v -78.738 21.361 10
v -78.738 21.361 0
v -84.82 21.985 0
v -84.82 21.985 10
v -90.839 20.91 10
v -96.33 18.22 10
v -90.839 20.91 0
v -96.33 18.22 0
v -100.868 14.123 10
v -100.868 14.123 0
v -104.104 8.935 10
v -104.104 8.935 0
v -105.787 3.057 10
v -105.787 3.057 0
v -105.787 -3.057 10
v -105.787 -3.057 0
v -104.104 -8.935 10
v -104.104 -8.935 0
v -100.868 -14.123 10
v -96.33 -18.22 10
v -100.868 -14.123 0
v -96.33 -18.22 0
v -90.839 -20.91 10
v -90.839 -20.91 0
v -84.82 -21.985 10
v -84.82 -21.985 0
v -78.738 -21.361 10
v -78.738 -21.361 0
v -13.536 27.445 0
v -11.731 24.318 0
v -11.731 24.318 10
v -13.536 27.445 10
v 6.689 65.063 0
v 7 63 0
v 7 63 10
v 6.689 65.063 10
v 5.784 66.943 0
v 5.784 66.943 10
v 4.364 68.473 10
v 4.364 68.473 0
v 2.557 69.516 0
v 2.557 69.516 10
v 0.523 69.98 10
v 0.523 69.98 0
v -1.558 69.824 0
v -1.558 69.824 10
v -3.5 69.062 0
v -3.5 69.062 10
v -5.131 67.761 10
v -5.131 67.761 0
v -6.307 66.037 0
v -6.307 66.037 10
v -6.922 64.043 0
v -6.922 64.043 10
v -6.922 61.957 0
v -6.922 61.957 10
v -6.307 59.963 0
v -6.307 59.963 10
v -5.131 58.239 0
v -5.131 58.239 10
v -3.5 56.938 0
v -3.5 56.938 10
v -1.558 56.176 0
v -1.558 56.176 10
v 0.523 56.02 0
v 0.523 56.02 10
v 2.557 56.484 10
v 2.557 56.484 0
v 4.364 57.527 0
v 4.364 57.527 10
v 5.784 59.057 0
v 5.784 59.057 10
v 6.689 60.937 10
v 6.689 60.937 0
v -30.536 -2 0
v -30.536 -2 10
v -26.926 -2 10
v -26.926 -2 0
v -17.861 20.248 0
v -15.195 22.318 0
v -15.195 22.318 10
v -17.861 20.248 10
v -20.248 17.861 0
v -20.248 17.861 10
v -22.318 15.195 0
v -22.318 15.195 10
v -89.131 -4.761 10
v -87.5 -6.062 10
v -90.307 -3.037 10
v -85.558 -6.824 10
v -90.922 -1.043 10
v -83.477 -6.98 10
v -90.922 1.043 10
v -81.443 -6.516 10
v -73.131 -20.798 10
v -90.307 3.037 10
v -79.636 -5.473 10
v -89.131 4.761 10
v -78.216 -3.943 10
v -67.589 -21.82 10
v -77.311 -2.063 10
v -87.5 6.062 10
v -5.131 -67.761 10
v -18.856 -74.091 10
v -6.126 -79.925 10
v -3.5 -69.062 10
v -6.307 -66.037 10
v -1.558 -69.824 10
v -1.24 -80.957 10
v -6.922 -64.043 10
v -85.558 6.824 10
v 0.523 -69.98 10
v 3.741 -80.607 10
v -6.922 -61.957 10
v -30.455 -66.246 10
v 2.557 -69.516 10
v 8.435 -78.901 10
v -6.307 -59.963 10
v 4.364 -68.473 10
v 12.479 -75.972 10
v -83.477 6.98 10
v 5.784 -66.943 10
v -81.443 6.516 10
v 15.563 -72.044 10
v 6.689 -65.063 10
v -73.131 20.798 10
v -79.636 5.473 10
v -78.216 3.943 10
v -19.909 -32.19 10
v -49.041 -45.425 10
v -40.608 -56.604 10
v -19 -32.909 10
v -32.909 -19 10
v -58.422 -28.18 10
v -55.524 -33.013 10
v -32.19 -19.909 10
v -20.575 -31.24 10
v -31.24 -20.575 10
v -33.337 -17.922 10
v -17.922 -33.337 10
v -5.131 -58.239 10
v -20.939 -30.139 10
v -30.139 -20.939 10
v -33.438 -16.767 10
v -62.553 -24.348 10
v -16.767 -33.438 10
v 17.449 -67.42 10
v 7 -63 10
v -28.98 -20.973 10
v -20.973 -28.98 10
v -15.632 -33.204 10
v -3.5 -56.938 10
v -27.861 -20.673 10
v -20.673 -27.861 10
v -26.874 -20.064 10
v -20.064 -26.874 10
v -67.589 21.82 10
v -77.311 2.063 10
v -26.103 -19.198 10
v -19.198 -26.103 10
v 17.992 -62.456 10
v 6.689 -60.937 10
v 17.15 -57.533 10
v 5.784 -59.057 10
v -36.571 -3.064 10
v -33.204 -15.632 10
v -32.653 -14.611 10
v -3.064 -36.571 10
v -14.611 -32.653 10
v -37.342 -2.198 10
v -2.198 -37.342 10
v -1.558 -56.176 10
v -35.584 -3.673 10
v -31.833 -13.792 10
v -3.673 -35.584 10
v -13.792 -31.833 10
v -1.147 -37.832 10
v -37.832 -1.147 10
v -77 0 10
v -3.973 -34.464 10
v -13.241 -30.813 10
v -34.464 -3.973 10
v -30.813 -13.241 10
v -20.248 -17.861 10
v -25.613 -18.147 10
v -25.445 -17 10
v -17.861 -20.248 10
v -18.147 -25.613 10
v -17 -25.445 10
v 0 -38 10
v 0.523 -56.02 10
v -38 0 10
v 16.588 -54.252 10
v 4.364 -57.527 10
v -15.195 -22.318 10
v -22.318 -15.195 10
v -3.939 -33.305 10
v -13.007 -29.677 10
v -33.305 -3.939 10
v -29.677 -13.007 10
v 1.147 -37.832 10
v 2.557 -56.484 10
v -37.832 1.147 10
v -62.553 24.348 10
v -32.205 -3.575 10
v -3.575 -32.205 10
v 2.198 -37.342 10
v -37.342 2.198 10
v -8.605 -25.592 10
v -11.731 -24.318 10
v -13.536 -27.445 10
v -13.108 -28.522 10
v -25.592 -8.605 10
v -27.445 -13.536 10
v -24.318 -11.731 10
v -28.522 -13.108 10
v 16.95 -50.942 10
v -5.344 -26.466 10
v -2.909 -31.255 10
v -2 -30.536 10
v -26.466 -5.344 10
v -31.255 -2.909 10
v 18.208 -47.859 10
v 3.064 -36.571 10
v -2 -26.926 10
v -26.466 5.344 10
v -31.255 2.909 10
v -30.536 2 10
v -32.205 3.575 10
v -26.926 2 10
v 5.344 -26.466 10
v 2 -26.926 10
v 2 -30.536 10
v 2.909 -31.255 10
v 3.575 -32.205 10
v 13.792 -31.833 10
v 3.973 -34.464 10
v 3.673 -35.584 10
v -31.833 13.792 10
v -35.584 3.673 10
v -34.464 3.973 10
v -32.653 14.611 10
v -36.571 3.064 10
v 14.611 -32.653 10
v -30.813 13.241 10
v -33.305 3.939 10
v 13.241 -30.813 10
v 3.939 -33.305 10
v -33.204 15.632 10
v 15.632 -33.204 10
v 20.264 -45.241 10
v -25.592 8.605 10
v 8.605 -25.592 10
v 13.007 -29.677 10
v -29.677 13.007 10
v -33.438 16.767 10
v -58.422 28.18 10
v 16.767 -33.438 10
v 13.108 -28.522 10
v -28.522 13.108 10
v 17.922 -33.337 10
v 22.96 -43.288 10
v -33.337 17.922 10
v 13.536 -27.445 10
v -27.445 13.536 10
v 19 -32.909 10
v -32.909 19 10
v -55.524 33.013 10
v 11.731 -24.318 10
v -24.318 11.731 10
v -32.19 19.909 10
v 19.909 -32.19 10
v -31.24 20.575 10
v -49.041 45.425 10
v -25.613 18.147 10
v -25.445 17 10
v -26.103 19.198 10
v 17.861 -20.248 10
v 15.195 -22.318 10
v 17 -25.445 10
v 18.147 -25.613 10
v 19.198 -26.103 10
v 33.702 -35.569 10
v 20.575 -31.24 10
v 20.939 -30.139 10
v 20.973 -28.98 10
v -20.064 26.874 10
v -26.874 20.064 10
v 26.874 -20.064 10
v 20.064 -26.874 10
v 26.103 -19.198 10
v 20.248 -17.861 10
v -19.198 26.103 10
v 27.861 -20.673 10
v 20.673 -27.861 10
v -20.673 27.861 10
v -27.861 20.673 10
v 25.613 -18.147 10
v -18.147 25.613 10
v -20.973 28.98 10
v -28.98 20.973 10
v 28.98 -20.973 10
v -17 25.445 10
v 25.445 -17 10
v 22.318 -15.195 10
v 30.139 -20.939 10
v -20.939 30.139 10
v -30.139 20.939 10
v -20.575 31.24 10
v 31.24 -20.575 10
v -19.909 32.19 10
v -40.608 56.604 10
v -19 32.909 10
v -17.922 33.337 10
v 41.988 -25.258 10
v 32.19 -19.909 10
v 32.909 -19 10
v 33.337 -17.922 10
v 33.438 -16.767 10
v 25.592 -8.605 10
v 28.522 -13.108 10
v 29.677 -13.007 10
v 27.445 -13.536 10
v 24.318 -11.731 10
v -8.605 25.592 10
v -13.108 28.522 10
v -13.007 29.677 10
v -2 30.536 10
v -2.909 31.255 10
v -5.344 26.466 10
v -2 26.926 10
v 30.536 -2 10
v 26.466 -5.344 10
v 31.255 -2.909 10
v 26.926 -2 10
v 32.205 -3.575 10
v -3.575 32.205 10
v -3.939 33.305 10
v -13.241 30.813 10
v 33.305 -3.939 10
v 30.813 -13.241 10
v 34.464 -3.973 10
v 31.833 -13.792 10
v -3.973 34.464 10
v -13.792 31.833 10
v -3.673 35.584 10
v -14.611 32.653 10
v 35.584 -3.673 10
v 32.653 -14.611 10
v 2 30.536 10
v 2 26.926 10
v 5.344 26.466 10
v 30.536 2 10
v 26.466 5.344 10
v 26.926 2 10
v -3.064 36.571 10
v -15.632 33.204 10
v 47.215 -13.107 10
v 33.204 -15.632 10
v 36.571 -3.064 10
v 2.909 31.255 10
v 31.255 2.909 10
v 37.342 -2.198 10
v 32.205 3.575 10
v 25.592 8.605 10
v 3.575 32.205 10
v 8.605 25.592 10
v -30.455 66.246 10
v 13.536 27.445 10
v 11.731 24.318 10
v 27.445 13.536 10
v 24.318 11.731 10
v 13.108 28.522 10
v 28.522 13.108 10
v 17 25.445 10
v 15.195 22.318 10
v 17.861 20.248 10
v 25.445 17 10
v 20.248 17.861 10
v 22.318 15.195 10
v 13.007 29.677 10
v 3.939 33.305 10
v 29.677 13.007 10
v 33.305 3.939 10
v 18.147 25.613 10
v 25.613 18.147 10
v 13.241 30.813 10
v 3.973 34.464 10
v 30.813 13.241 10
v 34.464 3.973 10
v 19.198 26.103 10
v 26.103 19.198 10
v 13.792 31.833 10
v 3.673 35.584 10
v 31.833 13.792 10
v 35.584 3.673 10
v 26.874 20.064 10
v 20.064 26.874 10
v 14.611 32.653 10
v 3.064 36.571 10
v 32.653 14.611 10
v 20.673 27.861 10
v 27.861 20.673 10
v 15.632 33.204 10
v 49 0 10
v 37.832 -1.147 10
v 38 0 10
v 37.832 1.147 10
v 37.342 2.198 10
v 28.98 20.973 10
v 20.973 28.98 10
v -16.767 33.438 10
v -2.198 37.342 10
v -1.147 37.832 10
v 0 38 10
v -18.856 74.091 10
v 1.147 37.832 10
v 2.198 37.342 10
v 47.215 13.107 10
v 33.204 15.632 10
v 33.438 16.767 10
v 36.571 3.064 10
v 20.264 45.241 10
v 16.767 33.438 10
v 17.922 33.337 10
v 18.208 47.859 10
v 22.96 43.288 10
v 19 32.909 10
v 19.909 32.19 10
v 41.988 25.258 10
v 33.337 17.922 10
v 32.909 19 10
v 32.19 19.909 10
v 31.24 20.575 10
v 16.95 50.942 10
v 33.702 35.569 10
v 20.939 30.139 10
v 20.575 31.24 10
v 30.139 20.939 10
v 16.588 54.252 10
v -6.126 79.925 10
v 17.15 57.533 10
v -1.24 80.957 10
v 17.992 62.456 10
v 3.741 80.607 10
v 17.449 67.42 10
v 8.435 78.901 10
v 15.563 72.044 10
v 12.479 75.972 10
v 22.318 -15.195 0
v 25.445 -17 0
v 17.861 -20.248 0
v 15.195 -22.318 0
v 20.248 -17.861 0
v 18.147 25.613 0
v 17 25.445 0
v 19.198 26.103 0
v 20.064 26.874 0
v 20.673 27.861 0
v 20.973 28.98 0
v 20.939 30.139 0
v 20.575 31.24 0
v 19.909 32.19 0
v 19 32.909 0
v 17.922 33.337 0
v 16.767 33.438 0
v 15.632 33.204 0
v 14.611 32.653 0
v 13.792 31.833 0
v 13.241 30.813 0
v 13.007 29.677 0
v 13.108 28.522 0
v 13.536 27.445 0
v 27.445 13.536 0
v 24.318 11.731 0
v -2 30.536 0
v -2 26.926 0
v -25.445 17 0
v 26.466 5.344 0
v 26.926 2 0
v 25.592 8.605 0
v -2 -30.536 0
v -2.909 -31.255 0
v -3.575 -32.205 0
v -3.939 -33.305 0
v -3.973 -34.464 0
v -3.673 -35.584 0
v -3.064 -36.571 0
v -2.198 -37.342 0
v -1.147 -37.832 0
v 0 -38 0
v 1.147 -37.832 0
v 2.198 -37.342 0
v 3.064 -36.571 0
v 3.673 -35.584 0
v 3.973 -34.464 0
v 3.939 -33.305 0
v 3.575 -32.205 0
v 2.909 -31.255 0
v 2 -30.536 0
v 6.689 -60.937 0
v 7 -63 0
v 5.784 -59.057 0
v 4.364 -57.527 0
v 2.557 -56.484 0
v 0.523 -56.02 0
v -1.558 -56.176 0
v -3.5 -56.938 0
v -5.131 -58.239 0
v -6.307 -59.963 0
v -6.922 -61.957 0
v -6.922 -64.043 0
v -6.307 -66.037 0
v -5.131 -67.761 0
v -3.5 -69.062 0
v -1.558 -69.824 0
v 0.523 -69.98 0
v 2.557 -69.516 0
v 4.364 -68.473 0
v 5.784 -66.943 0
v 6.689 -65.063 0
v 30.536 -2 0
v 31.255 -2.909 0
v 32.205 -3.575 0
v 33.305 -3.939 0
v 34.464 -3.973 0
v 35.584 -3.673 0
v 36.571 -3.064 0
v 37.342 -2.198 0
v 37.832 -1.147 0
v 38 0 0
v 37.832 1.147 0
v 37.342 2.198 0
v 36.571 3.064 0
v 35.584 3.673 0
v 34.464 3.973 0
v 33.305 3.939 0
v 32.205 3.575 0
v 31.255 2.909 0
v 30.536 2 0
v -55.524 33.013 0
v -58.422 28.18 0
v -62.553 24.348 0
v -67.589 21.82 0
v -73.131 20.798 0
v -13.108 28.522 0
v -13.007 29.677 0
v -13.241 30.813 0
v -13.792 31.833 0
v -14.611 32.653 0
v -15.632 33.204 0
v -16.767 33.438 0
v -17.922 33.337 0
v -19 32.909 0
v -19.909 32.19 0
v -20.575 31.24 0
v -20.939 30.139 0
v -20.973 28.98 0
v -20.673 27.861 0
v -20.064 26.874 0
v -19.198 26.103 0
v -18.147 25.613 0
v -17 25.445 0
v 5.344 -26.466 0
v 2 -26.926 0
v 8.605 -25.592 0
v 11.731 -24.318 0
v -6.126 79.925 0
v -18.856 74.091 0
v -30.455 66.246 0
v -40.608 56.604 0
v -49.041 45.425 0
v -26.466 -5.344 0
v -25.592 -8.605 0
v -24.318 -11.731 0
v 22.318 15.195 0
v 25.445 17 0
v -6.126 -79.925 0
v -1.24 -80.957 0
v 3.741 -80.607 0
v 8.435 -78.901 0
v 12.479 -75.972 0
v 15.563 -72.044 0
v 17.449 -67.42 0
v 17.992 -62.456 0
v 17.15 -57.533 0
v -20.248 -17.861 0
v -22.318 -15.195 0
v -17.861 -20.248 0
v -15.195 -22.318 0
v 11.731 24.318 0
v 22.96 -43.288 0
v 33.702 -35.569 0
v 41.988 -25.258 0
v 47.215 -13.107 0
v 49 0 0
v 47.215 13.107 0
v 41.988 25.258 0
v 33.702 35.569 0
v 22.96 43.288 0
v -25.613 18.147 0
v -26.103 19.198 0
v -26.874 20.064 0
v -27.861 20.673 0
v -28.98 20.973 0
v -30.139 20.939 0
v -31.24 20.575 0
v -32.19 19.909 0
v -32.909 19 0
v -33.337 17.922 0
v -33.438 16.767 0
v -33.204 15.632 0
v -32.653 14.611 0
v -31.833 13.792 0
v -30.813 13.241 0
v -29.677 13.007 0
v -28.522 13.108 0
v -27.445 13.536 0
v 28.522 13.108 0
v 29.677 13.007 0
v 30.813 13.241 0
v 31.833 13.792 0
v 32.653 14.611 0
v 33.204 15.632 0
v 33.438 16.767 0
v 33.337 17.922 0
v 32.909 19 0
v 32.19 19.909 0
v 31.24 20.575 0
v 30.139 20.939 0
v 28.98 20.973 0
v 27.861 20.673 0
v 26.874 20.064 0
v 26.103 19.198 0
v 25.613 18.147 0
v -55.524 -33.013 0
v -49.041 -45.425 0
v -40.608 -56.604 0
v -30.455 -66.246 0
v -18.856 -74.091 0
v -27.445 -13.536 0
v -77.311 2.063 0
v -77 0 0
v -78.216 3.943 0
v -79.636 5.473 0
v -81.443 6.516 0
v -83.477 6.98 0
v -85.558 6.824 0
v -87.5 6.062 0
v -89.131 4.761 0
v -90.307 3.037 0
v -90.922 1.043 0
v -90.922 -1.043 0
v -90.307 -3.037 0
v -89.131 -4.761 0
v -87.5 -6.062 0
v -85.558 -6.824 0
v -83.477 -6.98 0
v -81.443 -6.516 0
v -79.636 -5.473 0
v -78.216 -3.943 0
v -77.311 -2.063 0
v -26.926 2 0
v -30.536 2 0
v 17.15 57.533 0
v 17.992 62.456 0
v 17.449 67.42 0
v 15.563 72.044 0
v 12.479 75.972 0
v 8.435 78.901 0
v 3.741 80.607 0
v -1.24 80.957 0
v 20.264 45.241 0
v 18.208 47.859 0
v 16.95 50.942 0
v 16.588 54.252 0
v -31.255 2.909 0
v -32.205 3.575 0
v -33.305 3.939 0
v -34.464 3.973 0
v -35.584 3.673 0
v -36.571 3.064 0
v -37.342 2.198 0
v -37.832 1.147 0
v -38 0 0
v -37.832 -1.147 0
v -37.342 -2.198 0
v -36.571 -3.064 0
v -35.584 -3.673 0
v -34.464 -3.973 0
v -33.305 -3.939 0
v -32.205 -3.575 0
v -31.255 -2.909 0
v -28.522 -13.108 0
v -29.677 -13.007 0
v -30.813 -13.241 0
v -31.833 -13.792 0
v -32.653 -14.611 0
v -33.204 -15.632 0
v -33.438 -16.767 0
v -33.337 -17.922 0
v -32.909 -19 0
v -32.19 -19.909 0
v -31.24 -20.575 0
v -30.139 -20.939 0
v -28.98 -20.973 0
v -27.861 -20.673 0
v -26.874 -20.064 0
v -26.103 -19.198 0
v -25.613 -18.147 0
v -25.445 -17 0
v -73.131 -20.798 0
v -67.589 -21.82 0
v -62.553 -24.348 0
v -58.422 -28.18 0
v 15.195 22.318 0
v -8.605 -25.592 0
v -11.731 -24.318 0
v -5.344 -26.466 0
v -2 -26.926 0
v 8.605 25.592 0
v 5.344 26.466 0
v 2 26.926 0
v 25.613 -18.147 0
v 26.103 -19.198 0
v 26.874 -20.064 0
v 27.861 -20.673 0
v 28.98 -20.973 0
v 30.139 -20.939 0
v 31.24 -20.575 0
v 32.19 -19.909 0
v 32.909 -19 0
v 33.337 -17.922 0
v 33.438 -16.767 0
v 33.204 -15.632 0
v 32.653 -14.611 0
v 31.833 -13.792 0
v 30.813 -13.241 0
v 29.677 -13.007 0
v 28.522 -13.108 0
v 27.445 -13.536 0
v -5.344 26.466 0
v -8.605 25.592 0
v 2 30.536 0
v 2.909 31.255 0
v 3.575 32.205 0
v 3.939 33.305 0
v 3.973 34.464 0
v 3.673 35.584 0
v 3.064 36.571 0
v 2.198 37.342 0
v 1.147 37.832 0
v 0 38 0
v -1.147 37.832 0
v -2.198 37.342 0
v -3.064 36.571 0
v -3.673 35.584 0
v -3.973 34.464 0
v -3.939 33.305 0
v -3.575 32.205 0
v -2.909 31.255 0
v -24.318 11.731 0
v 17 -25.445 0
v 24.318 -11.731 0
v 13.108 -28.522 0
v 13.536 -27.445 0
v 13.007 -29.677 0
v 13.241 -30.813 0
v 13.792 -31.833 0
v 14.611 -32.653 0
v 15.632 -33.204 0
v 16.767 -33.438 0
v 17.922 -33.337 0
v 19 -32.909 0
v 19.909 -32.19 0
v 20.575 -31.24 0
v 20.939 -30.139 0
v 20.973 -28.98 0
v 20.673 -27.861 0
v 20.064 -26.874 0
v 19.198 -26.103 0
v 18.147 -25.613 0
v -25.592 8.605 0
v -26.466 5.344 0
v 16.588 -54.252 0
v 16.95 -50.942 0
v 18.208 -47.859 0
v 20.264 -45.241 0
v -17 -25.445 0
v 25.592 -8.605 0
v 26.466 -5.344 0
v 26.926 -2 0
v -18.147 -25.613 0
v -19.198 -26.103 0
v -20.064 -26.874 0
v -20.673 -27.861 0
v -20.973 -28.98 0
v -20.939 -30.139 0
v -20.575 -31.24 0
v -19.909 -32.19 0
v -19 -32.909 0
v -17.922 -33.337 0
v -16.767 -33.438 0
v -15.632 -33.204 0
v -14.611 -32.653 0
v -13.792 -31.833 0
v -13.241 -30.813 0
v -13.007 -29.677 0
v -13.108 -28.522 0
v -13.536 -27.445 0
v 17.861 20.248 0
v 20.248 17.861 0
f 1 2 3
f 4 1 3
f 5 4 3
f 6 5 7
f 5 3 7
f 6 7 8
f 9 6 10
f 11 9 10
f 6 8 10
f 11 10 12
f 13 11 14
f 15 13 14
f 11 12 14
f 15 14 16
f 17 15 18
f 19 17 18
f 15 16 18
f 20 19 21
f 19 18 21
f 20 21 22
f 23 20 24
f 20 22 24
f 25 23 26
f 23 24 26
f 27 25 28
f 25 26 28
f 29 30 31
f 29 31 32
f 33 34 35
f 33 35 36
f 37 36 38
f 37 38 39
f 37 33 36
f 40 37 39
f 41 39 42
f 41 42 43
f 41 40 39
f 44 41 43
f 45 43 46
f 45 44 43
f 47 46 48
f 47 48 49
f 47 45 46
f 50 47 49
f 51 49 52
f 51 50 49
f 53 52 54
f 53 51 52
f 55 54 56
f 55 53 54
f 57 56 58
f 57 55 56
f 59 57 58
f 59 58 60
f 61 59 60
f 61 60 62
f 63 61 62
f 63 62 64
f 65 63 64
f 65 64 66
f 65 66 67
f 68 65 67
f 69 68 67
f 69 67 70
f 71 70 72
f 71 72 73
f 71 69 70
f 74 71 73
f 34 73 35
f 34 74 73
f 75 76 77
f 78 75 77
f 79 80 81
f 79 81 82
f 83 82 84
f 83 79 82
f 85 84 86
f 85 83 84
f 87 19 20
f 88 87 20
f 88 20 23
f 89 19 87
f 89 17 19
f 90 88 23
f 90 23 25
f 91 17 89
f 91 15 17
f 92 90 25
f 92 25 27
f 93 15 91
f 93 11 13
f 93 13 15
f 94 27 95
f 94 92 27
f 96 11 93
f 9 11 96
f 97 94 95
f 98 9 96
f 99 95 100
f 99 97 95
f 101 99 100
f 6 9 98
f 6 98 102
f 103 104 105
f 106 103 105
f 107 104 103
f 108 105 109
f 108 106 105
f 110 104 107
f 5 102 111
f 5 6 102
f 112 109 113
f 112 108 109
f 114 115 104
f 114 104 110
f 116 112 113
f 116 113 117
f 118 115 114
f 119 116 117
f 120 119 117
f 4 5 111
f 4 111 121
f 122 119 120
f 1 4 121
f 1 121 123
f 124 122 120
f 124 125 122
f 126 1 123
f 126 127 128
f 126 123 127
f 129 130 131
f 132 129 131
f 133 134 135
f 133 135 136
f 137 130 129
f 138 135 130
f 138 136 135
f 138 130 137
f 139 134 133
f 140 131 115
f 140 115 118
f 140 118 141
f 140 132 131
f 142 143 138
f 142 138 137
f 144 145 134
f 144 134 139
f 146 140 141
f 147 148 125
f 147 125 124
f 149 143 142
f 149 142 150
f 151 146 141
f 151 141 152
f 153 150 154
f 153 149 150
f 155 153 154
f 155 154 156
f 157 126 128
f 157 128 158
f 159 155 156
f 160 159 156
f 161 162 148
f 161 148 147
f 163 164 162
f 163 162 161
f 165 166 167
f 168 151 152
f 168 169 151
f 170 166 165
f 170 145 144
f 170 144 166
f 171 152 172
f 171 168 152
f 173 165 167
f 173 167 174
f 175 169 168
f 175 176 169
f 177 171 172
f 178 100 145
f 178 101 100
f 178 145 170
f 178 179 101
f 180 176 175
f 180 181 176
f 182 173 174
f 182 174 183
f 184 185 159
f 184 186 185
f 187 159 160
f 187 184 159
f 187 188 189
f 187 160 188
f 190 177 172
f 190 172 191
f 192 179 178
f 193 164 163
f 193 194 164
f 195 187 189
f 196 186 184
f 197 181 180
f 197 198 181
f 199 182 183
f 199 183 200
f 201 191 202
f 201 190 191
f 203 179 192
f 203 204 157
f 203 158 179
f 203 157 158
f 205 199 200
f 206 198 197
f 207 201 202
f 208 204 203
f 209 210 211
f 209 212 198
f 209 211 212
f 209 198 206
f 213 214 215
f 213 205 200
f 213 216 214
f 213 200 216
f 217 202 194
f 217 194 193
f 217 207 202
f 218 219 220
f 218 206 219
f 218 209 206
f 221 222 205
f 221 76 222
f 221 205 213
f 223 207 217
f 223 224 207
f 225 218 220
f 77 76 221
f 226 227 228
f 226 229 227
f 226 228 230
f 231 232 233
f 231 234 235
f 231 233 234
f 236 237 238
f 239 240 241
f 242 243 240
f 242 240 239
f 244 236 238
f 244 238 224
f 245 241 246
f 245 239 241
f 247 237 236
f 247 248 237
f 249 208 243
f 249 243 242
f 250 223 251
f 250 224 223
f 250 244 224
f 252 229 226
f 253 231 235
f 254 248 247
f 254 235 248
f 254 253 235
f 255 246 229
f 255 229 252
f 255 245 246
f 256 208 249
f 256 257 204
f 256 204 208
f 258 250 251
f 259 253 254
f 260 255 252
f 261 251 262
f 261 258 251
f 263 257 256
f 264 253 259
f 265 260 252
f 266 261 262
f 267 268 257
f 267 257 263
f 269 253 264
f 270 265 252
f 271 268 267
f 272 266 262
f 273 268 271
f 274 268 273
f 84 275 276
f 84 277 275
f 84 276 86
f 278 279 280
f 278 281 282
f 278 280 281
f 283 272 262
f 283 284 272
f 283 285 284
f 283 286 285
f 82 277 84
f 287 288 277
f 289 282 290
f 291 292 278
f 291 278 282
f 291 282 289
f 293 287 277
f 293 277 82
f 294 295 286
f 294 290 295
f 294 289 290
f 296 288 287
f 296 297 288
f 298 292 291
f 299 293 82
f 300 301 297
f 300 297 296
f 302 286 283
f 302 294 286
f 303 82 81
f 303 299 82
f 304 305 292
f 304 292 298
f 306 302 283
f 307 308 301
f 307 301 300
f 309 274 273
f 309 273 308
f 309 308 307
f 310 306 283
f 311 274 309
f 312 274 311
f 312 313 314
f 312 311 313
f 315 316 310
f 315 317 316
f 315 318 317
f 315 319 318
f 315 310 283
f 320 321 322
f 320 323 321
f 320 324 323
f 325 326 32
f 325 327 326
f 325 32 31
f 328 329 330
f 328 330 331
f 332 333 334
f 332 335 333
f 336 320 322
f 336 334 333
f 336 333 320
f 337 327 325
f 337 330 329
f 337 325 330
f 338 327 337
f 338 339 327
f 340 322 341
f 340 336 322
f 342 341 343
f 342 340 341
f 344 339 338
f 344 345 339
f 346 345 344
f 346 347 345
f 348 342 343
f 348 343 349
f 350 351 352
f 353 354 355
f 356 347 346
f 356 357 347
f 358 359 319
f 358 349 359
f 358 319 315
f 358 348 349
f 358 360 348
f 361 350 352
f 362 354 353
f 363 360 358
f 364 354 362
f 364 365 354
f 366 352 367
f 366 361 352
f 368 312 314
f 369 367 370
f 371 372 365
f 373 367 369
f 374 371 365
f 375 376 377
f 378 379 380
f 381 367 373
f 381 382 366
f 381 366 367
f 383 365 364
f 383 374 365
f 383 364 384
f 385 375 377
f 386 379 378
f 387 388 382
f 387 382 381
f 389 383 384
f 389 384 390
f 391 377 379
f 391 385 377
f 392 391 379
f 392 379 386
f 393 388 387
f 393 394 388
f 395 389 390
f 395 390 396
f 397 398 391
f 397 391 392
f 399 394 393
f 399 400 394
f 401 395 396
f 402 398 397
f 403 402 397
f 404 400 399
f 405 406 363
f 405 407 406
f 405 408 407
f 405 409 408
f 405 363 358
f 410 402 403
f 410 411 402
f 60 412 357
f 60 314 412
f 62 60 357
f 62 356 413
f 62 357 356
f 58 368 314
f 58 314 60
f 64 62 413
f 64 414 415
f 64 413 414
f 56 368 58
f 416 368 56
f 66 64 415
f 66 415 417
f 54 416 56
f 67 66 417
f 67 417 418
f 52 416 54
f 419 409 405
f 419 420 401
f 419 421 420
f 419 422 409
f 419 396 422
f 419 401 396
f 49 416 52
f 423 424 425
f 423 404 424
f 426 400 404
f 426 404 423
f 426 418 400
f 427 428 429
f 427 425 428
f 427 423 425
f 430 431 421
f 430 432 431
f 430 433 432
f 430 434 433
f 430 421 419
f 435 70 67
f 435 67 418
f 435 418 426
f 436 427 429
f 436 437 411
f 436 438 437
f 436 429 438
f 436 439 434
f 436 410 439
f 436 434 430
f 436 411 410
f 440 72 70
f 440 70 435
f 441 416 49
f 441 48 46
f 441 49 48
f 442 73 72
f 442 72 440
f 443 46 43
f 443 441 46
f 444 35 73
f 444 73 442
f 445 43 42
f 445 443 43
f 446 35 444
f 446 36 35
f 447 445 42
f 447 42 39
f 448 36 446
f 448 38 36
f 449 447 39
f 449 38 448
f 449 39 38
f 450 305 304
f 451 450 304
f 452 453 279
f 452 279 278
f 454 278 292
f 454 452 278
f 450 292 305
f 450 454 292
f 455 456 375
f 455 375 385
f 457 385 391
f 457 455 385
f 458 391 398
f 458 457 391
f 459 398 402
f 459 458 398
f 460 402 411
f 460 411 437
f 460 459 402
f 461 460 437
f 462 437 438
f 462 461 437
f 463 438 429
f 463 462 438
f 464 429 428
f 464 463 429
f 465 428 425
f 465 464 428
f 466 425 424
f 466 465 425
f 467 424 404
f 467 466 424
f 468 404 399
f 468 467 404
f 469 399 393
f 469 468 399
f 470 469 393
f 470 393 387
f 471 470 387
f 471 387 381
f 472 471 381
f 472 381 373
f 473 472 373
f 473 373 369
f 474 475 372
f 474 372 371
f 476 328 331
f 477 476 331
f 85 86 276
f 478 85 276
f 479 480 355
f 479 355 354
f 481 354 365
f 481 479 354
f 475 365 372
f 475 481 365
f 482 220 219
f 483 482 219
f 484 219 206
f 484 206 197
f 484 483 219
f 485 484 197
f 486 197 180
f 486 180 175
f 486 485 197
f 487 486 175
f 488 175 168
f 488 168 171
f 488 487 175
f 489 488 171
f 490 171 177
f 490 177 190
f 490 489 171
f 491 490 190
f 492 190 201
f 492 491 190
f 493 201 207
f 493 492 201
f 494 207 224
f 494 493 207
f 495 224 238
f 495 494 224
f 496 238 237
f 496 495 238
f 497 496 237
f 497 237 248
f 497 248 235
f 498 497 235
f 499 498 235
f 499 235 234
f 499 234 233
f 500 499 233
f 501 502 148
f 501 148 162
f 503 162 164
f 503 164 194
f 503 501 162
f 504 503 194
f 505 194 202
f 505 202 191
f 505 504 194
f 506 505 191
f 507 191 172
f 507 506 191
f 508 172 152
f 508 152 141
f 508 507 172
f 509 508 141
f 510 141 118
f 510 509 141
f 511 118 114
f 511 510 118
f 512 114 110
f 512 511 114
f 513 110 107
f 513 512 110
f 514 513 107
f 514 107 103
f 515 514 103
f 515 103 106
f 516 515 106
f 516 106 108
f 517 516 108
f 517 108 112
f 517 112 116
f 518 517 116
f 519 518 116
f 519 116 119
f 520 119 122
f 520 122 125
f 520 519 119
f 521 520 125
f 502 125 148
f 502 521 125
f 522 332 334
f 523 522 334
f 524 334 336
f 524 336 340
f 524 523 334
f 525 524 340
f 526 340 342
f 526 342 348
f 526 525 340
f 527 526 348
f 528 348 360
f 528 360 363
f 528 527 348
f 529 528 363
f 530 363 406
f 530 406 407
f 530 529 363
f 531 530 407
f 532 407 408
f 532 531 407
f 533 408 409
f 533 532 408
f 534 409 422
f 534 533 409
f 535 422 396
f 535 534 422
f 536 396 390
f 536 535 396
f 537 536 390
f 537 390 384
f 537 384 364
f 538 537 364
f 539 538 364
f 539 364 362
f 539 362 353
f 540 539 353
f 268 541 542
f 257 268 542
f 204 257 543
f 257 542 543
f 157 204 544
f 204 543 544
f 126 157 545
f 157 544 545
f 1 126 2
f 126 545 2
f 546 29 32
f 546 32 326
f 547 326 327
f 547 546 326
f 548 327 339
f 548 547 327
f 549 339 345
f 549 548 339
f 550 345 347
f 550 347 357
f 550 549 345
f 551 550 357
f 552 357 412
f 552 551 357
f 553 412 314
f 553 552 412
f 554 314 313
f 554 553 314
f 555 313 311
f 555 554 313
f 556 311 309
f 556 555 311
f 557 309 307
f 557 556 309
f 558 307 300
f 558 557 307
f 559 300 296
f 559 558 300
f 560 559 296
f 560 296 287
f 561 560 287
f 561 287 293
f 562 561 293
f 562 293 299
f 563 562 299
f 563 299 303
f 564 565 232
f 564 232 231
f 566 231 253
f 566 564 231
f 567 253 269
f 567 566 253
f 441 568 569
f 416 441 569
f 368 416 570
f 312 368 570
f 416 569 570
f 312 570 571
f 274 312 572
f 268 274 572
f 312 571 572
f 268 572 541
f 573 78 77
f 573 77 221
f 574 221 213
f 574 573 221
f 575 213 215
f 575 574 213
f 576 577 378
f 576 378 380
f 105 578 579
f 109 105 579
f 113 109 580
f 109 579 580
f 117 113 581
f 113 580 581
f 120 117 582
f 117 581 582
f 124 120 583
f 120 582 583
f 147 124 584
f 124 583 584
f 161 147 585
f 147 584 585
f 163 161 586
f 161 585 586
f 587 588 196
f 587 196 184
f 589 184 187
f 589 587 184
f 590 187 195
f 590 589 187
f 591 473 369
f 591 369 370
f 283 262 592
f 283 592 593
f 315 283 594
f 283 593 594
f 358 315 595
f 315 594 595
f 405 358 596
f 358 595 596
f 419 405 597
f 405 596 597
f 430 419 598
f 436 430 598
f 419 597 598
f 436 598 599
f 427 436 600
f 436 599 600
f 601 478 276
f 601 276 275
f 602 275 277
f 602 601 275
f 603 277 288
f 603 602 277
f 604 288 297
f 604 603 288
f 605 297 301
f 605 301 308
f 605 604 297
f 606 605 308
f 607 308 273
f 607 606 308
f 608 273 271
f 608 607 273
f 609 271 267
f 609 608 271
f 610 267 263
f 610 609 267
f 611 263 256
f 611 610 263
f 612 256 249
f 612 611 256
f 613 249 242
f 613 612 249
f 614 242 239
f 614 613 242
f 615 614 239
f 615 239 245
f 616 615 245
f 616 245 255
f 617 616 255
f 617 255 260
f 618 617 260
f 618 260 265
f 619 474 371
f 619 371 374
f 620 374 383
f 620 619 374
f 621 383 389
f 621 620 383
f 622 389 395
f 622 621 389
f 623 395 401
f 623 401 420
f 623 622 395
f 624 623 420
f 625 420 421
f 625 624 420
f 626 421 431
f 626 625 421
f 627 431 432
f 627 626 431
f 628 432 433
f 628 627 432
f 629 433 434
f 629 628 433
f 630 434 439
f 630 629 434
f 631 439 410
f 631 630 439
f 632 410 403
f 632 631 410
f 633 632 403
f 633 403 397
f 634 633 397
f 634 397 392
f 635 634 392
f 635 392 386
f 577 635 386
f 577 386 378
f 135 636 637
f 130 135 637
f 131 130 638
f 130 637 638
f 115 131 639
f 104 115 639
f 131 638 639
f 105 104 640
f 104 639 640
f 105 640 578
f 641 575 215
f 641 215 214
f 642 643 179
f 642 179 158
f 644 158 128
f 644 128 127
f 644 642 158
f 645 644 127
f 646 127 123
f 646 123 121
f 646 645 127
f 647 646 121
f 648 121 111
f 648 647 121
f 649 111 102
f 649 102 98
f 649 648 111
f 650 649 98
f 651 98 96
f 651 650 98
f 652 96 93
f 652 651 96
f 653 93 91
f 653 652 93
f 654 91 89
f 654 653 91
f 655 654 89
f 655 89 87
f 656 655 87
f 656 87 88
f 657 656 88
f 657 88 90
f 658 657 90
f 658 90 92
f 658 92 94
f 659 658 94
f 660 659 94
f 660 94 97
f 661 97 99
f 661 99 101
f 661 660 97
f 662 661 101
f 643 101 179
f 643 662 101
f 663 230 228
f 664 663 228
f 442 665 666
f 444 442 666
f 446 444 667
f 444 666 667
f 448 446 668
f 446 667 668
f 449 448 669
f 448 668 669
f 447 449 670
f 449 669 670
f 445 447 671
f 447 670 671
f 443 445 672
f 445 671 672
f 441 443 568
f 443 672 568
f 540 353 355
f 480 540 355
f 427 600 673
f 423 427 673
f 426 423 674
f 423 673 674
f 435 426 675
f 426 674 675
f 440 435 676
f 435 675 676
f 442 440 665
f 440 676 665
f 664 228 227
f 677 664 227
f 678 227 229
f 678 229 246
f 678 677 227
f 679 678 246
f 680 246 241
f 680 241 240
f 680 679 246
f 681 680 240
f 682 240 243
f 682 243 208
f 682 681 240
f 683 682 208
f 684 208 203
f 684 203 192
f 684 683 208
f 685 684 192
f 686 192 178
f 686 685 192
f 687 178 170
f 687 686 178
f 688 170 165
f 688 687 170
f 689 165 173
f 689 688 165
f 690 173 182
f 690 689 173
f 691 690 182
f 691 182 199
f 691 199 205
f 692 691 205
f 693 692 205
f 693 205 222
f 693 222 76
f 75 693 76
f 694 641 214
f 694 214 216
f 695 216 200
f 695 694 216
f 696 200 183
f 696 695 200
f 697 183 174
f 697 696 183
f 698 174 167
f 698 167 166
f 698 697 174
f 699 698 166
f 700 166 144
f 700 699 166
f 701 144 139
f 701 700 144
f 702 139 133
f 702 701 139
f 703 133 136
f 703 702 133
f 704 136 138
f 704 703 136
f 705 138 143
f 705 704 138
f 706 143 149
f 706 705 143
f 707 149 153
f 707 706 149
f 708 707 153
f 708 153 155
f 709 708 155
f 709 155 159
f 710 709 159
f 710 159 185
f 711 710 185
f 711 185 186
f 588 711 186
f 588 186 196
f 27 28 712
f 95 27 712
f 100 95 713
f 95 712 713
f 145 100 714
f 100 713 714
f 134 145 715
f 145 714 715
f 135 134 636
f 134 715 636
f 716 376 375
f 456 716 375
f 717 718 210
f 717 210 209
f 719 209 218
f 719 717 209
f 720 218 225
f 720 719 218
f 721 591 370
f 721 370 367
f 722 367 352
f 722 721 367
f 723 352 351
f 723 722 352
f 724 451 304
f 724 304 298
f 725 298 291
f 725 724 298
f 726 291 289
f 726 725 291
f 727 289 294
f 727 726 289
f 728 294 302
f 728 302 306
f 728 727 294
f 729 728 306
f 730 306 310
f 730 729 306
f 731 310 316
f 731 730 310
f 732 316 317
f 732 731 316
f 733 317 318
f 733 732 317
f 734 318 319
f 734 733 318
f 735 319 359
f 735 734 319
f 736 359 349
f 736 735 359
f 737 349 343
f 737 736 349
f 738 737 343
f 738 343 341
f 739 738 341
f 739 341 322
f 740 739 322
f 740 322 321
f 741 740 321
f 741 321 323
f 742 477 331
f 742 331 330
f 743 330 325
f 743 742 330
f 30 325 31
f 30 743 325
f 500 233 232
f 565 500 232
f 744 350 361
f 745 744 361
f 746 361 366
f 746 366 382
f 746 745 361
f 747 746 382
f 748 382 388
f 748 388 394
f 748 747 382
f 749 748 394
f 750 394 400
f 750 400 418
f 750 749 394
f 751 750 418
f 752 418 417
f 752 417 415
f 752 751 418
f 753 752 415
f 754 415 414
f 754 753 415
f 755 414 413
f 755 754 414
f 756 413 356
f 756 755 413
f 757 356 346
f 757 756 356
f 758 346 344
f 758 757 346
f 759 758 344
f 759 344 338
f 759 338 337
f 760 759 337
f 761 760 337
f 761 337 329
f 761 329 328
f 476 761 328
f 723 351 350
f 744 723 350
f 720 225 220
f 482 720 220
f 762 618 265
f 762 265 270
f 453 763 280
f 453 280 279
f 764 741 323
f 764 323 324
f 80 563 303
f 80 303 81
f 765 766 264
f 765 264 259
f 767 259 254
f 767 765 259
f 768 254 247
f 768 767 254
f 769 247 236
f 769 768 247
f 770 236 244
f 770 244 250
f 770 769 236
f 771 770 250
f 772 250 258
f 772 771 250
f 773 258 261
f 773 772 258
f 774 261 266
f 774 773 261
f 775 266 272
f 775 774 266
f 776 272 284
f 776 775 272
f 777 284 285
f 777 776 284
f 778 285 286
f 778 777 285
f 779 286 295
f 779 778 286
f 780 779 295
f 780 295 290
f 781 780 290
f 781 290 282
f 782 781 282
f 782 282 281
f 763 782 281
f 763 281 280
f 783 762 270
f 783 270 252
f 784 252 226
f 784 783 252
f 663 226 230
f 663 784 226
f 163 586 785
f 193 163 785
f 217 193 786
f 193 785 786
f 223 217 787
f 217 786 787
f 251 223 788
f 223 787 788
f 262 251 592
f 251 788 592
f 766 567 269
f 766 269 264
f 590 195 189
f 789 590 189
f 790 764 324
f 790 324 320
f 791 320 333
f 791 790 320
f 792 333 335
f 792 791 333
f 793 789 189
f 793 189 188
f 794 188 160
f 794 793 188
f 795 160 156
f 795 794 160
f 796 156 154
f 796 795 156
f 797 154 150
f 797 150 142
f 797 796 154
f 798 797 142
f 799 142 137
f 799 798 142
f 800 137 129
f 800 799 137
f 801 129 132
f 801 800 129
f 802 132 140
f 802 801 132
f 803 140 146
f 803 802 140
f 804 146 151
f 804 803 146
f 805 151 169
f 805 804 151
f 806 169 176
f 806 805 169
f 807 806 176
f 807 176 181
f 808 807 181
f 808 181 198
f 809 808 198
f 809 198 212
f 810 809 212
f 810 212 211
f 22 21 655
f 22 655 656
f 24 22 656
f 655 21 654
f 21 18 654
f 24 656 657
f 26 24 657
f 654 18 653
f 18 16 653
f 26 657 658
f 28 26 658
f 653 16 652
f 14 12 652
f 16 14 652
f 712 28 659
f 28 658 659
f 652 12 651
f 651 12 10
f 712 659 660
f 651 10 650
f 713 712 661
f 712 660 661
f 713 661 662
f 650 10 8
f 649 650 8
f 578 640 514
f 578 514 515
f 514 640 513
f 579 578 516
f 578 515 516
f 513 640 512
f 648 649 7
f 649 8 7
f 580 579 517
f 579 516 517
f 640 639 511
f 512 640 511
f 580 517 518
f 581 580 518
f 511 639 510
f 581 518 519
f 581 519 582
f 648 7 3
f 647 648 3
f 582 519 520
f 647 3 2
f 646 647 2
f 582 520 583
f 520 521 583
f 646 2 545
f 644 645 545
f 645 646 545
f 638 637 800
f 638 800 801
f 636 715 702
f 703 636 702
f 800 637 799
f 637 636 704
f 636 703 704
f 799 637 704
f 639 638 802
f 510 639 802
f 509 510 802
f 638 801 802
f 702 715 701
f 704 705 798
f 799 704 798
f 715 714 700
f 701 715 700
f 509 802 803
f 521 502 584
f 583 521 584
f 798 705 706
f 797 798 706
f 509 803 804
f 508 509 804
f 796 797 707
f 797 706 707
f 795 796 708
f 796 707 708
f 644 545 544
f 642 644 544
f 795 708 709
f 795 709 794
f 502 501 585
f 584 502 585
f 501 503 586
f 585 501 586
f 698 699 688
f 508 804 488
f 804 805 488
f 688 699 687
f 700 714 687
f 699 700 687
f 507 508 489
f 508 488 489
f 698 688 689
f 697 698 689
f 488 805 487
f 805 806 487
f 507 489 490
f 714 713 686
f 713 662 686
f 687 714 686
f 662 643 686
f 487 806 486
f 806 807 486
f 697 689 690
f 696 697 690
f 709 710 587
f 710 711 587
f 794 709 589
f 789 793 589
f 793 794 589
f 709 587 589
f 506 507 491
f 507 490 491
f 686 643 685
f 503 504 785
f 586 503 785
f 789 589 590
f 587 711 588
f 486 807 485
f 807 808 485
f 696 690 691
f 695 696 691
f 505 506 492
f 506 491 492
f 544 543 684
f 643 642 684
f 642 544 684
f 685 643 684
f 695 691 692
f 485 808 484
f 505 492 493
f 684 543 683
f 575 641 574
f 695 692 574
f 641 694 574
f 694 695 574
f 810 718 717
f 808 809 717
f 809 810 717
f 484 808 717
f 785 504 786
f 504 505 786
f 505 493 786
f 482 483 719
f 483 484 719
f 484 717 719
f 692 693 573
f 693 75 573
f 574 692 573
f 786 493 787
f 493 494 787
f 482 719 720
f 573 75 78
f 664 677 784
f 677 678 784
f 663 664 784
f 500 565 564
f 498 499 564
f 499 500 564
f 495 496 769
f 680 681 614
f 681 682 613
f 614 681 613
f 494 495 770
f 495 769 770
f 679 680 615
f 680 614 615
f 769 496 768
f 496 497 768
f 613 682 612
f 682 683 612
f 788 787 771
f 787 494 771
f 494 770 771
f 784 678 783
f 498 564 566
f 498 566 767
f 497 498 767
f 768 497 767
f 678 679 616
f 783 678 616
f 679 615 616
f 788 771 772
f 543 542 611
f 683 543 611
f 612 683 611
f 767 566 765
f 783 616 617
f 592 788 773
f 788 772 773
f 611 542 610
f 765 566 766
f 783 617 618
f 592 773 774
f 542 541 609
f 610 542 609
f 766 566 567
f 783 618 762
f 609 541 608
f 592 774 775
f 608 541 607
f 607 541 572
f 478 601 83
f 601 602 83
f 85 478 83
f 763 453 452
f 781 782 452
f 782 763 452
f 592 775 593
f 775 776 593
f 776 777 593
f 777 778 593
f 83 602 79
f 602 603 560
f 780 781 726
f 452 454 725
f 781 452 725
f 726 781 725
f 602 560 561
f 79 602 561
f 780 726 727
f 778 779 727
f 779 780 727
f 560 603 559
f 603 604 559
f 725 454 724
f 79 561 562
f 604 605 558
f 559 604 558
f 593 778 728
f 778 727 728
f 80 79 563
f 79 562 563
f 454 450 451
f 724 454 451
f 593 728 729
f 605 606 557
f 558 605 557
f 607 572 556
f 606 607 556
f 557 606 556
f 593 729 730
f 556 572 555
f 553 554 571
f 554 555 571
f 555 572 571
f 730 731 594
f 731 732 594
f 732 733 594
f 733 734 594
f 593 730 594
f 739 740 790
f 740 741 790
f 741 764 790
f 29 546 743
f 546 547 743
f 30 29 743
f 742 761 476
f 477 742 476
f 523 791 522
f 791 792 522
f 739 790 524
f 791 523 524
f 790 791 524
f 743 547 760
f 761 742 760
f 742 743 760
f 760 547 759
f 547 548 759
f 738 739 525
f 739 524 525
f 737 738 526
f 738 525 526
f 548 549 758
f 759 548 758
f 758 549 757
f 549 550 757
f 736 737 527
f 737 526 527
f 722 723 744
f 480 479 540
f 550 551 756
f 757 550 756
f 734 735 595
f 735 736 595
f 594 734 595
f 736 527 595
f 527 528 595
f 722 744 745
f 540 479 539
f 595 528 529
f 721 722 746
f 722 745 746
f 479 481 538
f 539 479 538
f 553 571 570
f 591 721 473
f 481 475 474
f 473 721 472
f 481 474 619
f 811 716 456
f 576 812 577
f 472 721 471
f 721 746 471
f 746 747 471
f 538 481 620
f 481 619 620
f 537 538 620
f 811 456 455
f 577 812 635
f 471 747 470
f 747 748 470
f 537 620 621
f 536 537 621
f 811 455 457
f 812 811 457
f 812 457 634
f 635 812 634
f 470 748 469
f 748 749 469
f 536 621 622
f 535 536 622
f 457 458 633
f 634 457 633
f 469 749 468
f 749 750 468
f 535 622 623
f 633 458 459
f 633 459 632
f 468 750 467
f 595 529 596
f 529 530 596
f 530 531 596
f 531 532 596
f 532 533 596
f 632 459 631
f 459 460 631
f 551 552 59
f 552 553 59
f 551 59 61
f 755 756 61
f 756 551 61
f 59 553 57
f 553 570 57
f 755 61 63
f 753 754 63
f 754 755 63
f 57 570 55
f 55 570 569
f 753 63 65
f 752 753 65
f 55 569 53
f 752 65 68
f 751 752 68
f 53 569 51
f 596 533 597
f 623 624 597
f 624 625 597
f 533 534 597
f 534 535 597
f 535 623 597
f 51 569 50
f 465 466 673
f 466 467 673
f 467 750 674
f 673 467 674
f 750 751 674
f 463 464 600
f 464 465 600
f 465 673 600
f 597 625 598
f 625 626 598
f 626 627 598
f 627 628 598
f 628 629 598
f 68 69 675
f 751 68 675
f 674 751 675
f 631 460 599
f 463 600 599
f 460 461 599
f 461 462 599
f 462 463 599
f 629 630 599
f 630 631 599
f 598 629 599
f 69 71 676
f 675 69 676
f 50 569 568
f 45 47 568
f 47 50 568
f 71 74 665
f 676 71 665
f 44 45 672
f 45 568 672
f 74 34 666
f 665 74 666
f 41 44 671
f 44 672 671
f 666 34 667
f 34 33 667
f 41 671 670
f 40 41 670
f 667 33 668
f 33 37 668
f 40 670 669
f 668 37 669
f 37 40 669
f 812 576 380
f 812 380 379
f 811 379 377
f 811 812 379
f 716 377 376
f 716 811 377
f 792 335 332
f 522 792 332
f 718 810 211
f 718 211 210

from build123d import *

# Parameters (mm, degrees)
CROQUIS1_R              = 49
CROQUIS1_R_2            = 7
SALIENTE_EXTRUIR1_DEPTH = 10


with BuildPart() as part:
    # Croquis1 → Saliente-Extruir1 (new body)
    # profile 1 of 3: a face of its own
    with BuildSketch(Plane.XY):
        Circle(CROQUIS1_R)
        with BuildLine():
            ThreePointArc((11.73086121, 24.318447633), (6.988114218, 26.07999731), (2, 26.925824036))
            Line((2, 26.925824036), (2, 30.535898385))
            ThreePointArc((2, 30.535898385), (0, 38), (-2, 30.535898385))
            Line((-2, 30.535898385), (-2, 26.925824036))
            ThreePointArc((-2, 26.925824036), (-6.988114218, 26.07999731), (-11.73086121, 24.318447633))
            Line((-11.73086121, 24.318447633), (-13.535898385, 27.444863729))
            ThreePointArc((-13.535898385, 27.444863729), (-19, 32.908965344), (-17, 25.444863729))
            Line((-17, 25.444863729), (-15.194962825, 22.318447633))
            ThreePointArc((-15.194962825, 22.318447633), (-19.091883092, 19.091883092), (-22.318447633, 15.194962825))
            Line((-22.318447633, 15.194962825), (-25.444863729, 17))
            ThreePointArc((-25.444863729, 17), (-32.908965344, 19), (-27.444863729, 13.535898385))
            Line((-27.444863729, 13.535898385), (-24.318447633, 11.73086121))
            ThreePointArc((-24.318447633, 11.73086121), (-26.07999731, 6.988114218), (-26.925824036, 2))
            Line((-26.925824036, 2), (-30.535898385, 2))
            ThreePointArc((-30.535898385, 2), (-38, 0), (-30.535898385, -2))
            Line((-30.535898385, -2), (-26.925824036, -2))
            ThreePointArc((-26.925824036, -2), (-26.07999731, -6.988114218), (-24.318447633, -11.73086121))
            Line((-24.318447633, -11.73086121), (-27.444863729, -13.535898385))
            ThreePointArc((-27.444863729, -13.535898385), (-32.908965344, -19), (-25.444863729, -17))
            Line((-25.444863729, -17), (-22.318447633, -15.194962825))
            ThreePointArc((-22.318447633, -15.194962825), (-19.091883092, -19.091883092), (-15.194962825, -22.318447633))
            Line((-15.194962825, -22.318447633), (-17, -25.444863729))
            ThreePointArc((-17, -25.444863729), (-19, -32.908965344), (-13.535898385, -27.444863729))
            Line((-13.535898385, -27.444863729), (-11.73086121, -24.318447633))
            ThreePointArc((-11.73086121, -24.318447633), (-6.988114218, -26.07999731), (-2, -26.925824036))
            Line((-2, -26.925824036), (-2, -30.535898385))
            ThreePointArc((-2, -30.535898385), (0, -38), (2, -30.535898385))
            Line((2, -30.535898385), (2, -26.925824036))
            ThreePointArc((2, -26.925824036), (6.988114218, -26.07999731), (11.73086121, -24.318447633))
            Line((11.73086121, -24.318447633), (13.535898385, -27.444863729))
            ThreePointArc((13.535898385, -27.444863729), (19, -32.908965344), (17, -25.444863729))
            Line((17, -25.444863729), (15.194962825, -22.318447633))
            ThreePointArc((15.194962825, -22.318447633), (19.091883092, -19.091883092), (22.318447633, -15.194962825))
            Line((22.318447633, -15.194962825), (25.444863729, -17))
            ThreePointArc((25.444863729, -17), (32.908965344, -19), (27.444863729, -13.535898385))
            Line((27.444863729, -13.535898385), (24.318447633, -11.73086121))
            ThreePointArc((24.318447633, -11.73086121), (26.07999731, -6.988114218), (26.925824036, -2))
            Line((26.925824036, -2), (30.535898385, -2))
            ThreePointArc((30.535898385, -2), (38, 0), (30.535898385, 2))
            Line((30.535898385, 2), (26.925824036, 2))
            ThreePointArc((26.925824036, 2), (26.07999731, 6.988114218), (24.318447633, 11.73086121))
            Line((24.318447633, 11.73086121), (27.444863729, 13.535898385))
            ThreePointArc((27.444863729, 13.535898385), (32.908965344, 19), (25.444863729, 17))
            Line((25.444863729, 17), (22.318447633, 15.194962825))
            ThreePointArc((22.318447633, 15.194962825), (19.091883092, 19.091883092), (15.194962825, 22.318447633))
            Line((15.194962825, 22.318447633), (17, 25.444863729))
            ThreePointArc((17, 25.444863729), (19, 32.908965344), (13.535898385, 27.444863729))
            Line((13.535898385, 27.444863729), (11.73086121, 24.318447633))
        make_face(mode=Mode.SUBTRACT)
    # profile 2 of 3: a face of its own
    with BuildSketch(Plane.XY):
        with BuildLine():
            ThreePointArc((22.960111456, -43.287795993), (-49, 0), (22.960111456, 43.287795993))
            ThreePointArc((22.960111456, 43.287795993), (17.471680778, 49.356927241), (17.149797537, 57.533333333))
            ThreePointArc((17.149797537, 57.533333333), (12.479188654, 75.97188693), (-6.126315717, 79.925373134))
            ThreePointArc((-6.126315717, 79.925373134), (-35.730309716, 61.63434209), (-55.523644659, 33.012983471))
            ThreePointArc((-55.523644659, 33.012983471), (-62.196491498, 0), (-55.523644659, -33.012983471))
            ThreePointArc((-55.523644659, -33.012983471), (-35.730309716, -61.63434209), (-6.126315717, -79.925373134))
            ThreePointArc((-6.126315717, -79.925373134), (12.479188654, -75.97188693), (17.149797537, -57.533333333))
            ThreePointArc((17.149797537, -57.533333333), (17.471680778, -49.356927241), (22.960111456, -43.287795993))
        make_face()
        with Locations((0, -63)):
            Circle(CROQUIS1_R_2, mode=Mode.SUBTRACT)
        with Locations((0, 63)):
            Circle(CROQUIS1_R_2, mode=Mode.SUBTRACT)
    # profile 3 of 3: a face of its own
    with BuildSketch(Plane.XY):
        with BuildLine():
            ThreePointArc((-55.523644659, -33.012983471), (-62.196491498, 0), (-55.523644659, 33.012983471))
            ThreePointArc((-55.523644659, 33.012983471), (-64.981782963, 22.905981014), (-78.737580645, 21.361342246))
            ThreePointArc((-78.737580645, 21.361342246), (-106, 0), (-78.737580645, -21.361342246))
            ThreePointArc((-78.737580645, -21.361342246), (-64.981782963, -22.905981014), (-55.523644659, -33.012983471))
        make_face()
        with Locations((-84, 0)):
            Circle(CROQUIS1_R_2, mode=Mode.SUBTRACT)
    extrude(amount=SALIENTE_EXTRUIR1_DEPTH)


solid = part.part
